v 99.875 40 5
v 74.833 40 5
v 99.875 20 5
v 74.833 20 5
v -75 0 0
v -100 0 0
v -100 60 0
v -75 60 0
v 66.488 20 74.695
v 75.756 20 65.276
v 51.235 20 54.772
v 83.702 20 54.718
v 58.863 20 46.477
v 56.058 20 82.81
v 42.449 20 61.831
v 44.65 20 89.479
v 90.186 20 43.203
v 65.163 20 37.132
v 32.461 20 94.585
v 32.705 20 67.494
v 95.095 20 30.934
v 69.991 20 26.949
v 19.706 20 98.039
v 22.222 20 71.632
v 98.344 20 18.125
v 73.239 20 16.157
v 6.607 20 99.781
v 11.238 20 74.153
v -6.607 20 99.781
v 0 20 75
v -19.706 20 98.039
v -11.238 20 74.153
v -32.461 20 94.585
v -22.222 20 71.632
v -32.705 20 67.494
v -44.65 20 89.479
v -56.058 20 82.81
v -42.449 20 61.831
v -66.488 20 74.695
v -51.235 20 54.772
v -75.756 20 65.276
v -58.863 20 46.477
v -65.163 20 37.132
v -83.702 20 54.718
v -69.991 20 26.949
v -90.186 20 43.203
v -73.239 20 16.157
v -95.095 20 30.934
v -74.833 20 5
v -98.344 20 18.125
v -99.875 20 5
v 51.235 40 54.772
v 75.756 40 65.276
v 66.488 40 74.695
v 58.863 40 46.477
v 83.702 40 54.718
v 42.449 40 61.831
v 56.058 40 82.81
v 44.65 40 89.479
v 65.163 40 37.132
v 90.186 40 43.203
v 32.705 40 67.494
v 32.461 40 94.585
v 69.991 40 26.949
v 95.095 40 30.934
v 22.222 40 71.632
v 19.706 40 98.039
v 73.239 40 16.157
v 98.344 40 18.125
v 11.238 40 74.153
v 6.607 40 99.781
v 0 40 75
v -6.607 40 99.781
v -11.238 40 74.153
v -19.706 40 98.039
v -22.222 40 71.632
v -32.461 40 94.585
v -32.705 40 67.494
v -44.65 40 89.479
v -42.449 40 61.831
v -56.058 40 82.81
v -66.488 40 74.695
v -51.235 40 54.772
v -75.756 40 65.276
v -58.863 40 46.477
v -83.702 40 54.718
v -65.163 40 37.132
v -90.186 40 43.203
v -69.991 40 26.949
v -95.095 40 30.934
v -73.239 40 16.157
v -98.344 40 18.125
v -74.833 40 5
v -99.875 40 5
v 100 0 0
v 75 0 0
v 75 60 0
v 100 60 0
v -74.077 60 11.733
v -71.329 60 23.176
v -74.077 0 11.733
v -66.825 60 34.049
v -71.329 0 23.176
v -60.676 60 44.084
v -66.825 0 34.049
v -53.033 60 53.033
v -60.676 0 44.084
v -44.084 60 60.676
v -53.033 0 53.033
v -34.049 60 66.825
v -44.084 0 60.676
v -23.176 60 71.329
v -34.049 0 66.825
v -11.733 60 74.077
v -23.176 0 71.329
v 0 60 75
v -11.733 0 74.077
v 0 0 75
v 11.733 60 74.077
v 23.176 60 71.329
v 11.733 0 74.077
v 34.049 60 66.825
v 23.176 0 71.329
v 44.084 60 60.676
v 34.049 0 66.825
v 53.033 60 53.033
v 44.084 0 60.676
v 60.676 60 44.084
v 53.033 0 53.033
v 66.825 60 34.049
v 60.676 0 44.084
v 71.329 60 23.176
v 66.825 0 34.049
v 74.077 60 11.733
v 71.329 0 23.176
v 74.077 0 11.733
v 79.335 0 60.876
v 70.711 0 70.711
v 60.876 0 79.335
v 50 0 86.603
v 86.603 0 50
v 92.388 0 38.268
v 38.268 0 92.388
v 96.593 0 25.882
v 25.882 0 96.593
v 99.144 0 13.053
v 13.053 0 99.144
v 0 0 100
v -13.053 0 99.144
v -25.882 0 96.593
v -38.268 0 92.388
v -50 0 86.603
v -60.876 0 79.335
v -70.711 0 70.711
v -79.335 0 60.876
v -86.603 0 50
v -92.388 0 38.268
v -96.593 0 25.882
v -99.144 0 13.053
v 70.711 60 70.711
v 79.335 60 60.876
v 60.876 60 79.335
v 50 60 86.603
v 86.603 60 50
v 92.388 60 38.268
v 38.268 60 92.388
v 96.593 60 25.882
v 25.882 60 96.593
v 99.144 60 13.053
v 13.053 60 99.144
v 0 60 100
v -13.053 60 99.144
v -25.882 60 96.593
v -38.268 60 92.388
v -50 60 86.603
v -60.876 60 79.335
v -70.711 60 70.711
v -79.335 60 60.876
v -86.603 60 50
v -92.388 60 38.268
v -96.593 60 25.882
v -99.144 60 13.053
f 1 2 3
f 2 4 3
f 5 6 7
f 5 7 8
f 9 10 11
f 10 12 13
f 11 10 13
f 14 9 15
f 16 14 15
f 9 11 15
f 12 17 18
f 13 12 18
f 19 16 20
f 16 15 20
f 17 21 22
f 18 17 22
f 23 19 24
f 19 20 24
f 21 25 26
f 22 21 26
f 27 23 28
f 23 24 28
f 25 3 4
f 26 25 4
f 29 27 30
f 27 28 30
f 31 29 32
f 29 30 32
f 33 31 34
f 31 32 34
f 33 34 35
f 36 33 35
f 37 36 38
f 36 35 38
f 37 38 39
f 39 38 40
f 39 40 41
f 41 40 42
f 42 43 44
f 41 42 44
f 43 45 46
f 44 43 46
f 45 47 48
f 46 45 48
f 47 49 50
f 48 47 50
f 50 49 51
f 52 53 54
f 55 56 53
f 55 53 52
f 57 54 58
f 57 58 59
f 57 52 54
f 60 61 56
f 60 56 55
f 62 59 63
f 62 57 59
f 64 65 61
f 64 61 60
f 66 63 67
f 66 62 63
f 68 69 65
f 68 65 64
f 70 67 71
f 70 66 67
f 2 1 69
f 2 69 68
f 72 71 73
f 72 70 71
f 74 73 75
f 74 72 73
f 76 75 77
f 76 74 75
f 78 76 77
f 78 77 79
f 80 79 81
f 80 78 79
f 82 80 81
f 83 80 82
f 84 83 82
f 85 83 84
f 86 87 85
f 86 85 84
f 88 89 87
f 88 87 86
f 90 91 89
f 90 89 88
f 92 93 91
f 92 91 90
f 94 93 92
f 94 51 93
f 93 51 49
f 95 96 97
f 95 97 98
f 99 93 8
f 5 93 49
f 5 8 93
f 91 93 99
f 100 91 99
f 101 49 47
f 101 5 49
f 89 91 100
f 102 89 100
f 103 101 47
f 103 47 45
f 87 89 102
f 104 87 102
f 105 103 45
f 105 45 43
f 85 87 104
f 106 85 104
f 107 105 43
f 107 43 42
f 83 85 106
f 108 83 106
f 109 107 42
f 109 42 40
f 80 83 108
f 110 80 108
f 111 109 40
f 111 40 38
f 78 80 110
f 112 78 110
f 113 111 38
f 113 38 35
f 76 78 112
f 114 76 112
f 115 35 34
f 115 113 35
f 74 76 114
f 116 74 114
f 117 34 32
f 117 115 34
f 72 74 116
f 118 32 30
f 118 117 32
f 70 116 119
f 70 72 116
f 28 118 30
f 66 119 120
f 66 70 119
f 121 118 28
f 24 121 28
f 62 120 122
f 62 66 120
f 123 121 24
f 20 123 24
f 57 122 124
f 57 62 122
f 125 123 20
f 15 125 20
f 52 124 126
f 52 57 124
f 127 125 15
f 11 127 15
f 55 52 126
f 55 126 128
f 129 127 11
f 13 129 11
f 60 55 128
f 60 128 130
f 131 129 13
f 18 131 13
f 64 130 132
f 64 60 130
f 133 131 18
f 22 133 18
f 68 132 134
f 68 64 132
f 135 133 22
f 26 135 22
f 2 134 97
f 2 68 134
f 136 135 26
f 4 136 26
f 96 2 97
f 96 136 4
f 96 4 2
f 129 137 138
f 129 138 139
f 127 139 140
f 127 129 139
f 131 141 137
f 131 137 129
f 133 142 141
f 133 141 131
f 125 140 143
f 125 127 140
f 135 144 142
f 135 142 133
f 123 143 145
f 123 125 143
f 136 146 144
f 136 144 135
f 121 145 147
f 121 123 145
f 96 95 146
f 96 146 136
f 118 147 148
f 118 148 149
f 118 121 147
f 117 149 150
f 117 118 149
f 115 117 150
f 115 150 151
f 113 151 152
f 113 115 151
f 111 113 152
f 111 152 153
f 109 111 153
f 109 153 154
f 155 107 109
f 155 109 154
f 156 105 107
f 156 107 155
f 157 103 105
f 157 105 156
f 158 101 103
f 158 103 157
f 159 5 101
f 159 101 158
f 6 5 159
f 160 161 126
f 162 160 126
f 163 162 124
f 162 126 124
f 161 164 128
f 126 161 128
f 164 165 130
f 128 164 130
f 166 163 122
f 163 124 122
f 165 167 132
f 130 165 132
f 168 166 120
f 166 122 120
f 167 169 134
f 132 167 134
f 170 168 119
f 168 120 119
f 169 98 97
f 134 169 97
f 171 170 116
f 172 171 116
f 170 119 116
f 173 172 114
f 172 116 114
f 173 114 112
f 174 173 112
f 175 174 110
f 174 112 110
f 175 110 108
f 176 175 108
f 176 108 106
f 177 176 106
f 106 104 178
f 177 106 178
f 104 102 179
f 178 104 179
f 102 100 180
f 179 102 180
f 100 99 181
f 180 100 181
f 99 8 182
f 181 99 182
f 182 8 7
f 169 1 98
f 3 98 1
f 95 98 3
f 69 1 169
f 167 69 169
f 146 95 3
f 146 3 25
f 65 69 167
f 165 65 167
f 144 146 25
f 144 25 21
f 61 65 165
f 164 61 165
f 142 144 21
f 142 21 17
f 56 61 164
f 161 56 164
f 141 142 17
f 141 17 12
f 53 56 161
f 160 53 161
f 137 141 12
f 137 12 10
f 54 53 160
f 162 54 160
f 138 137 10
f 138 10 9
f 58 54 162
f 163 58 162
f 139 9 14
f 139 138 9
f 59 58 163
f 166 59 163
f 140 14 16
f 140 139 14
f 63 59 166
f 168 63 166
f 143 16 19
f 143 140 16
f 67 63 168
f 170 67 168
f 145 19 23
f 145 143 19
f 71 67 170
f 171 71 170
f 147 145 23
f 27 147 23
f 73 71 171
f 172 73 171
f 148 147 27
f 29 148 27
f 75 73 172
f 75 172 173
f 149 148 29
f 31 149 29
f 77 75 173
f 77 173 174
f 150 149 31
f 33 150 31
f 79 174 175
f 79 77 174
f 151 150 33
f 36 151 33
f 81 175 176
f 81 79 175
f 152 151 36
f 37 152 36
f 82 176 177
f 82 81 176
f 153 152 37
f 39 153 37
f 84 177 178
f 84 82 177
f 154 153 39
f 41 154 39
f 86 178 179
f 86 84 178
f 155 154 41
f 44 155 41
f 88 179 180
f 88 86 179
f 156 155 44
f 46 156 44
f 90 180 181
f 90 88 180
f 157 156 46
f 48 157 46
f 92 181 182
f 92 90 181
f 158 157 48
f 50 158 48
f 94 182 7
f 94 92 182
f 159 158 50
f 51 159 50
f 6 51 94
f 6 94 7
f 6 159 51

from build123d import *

# Parameters (mm, degrees)
BOSS_EXTRUDE1_DEPTH     = 60
CUT_EXTRUDE4_DEPTH      = 10
CUT_EXTRUDE4_DEPTH_BACK = 10


with BuildPart() as part:
    # Sketch2 → Boss-Extrude1 (new body)
    with BuildSketch(Plane(origin=(0, 0, 0), x_dir=(1, 0, 0), z_dir=(0, 1, 0))):
        with BuildLine():
            Line((-100, 0), (-75, 0))
            ThreePointArc((-75, 0), (0, -75), (75, 0))
            Line((75, 0), (100, 0))
            ThreePointArc((100, 0), (0, -100), (-100, 0))
        make_face()
    extrude(amount=BOSS_EXTRUDE1_DEPTH)

    # Sketch4 → Cut-Extrude4 (cut, two sides)
    with BuildSketch(Plane(origin=(0, 30, 0), x_dir=(1, 0, 0), z_dir=(0, 1, 0))) as cut_extrude4_sk:
        with BuildLine():
            Line((-99.874921777, -5), (-74.833147735, -5))
            ThreePointArc((-74.833147735, -5), (0, -75), (74.833147735, -5))
            Line((74.833147735, -5), (99.874921777, -5))
            ThreePointArc((99.874921777, -5), (0, -100), (-99.874921777, -5))
        make_face()
    extrude(amount=CUT_EXTRUDE4_DEPTH, mode=Mode.SUBTRACT)
    extrude(cut_extrude4_sk.sketch, amount=-CUT_EXTRUDE4_DEPTH_BACK, mode=Mode.SUBTRACT)


solid = part.part
